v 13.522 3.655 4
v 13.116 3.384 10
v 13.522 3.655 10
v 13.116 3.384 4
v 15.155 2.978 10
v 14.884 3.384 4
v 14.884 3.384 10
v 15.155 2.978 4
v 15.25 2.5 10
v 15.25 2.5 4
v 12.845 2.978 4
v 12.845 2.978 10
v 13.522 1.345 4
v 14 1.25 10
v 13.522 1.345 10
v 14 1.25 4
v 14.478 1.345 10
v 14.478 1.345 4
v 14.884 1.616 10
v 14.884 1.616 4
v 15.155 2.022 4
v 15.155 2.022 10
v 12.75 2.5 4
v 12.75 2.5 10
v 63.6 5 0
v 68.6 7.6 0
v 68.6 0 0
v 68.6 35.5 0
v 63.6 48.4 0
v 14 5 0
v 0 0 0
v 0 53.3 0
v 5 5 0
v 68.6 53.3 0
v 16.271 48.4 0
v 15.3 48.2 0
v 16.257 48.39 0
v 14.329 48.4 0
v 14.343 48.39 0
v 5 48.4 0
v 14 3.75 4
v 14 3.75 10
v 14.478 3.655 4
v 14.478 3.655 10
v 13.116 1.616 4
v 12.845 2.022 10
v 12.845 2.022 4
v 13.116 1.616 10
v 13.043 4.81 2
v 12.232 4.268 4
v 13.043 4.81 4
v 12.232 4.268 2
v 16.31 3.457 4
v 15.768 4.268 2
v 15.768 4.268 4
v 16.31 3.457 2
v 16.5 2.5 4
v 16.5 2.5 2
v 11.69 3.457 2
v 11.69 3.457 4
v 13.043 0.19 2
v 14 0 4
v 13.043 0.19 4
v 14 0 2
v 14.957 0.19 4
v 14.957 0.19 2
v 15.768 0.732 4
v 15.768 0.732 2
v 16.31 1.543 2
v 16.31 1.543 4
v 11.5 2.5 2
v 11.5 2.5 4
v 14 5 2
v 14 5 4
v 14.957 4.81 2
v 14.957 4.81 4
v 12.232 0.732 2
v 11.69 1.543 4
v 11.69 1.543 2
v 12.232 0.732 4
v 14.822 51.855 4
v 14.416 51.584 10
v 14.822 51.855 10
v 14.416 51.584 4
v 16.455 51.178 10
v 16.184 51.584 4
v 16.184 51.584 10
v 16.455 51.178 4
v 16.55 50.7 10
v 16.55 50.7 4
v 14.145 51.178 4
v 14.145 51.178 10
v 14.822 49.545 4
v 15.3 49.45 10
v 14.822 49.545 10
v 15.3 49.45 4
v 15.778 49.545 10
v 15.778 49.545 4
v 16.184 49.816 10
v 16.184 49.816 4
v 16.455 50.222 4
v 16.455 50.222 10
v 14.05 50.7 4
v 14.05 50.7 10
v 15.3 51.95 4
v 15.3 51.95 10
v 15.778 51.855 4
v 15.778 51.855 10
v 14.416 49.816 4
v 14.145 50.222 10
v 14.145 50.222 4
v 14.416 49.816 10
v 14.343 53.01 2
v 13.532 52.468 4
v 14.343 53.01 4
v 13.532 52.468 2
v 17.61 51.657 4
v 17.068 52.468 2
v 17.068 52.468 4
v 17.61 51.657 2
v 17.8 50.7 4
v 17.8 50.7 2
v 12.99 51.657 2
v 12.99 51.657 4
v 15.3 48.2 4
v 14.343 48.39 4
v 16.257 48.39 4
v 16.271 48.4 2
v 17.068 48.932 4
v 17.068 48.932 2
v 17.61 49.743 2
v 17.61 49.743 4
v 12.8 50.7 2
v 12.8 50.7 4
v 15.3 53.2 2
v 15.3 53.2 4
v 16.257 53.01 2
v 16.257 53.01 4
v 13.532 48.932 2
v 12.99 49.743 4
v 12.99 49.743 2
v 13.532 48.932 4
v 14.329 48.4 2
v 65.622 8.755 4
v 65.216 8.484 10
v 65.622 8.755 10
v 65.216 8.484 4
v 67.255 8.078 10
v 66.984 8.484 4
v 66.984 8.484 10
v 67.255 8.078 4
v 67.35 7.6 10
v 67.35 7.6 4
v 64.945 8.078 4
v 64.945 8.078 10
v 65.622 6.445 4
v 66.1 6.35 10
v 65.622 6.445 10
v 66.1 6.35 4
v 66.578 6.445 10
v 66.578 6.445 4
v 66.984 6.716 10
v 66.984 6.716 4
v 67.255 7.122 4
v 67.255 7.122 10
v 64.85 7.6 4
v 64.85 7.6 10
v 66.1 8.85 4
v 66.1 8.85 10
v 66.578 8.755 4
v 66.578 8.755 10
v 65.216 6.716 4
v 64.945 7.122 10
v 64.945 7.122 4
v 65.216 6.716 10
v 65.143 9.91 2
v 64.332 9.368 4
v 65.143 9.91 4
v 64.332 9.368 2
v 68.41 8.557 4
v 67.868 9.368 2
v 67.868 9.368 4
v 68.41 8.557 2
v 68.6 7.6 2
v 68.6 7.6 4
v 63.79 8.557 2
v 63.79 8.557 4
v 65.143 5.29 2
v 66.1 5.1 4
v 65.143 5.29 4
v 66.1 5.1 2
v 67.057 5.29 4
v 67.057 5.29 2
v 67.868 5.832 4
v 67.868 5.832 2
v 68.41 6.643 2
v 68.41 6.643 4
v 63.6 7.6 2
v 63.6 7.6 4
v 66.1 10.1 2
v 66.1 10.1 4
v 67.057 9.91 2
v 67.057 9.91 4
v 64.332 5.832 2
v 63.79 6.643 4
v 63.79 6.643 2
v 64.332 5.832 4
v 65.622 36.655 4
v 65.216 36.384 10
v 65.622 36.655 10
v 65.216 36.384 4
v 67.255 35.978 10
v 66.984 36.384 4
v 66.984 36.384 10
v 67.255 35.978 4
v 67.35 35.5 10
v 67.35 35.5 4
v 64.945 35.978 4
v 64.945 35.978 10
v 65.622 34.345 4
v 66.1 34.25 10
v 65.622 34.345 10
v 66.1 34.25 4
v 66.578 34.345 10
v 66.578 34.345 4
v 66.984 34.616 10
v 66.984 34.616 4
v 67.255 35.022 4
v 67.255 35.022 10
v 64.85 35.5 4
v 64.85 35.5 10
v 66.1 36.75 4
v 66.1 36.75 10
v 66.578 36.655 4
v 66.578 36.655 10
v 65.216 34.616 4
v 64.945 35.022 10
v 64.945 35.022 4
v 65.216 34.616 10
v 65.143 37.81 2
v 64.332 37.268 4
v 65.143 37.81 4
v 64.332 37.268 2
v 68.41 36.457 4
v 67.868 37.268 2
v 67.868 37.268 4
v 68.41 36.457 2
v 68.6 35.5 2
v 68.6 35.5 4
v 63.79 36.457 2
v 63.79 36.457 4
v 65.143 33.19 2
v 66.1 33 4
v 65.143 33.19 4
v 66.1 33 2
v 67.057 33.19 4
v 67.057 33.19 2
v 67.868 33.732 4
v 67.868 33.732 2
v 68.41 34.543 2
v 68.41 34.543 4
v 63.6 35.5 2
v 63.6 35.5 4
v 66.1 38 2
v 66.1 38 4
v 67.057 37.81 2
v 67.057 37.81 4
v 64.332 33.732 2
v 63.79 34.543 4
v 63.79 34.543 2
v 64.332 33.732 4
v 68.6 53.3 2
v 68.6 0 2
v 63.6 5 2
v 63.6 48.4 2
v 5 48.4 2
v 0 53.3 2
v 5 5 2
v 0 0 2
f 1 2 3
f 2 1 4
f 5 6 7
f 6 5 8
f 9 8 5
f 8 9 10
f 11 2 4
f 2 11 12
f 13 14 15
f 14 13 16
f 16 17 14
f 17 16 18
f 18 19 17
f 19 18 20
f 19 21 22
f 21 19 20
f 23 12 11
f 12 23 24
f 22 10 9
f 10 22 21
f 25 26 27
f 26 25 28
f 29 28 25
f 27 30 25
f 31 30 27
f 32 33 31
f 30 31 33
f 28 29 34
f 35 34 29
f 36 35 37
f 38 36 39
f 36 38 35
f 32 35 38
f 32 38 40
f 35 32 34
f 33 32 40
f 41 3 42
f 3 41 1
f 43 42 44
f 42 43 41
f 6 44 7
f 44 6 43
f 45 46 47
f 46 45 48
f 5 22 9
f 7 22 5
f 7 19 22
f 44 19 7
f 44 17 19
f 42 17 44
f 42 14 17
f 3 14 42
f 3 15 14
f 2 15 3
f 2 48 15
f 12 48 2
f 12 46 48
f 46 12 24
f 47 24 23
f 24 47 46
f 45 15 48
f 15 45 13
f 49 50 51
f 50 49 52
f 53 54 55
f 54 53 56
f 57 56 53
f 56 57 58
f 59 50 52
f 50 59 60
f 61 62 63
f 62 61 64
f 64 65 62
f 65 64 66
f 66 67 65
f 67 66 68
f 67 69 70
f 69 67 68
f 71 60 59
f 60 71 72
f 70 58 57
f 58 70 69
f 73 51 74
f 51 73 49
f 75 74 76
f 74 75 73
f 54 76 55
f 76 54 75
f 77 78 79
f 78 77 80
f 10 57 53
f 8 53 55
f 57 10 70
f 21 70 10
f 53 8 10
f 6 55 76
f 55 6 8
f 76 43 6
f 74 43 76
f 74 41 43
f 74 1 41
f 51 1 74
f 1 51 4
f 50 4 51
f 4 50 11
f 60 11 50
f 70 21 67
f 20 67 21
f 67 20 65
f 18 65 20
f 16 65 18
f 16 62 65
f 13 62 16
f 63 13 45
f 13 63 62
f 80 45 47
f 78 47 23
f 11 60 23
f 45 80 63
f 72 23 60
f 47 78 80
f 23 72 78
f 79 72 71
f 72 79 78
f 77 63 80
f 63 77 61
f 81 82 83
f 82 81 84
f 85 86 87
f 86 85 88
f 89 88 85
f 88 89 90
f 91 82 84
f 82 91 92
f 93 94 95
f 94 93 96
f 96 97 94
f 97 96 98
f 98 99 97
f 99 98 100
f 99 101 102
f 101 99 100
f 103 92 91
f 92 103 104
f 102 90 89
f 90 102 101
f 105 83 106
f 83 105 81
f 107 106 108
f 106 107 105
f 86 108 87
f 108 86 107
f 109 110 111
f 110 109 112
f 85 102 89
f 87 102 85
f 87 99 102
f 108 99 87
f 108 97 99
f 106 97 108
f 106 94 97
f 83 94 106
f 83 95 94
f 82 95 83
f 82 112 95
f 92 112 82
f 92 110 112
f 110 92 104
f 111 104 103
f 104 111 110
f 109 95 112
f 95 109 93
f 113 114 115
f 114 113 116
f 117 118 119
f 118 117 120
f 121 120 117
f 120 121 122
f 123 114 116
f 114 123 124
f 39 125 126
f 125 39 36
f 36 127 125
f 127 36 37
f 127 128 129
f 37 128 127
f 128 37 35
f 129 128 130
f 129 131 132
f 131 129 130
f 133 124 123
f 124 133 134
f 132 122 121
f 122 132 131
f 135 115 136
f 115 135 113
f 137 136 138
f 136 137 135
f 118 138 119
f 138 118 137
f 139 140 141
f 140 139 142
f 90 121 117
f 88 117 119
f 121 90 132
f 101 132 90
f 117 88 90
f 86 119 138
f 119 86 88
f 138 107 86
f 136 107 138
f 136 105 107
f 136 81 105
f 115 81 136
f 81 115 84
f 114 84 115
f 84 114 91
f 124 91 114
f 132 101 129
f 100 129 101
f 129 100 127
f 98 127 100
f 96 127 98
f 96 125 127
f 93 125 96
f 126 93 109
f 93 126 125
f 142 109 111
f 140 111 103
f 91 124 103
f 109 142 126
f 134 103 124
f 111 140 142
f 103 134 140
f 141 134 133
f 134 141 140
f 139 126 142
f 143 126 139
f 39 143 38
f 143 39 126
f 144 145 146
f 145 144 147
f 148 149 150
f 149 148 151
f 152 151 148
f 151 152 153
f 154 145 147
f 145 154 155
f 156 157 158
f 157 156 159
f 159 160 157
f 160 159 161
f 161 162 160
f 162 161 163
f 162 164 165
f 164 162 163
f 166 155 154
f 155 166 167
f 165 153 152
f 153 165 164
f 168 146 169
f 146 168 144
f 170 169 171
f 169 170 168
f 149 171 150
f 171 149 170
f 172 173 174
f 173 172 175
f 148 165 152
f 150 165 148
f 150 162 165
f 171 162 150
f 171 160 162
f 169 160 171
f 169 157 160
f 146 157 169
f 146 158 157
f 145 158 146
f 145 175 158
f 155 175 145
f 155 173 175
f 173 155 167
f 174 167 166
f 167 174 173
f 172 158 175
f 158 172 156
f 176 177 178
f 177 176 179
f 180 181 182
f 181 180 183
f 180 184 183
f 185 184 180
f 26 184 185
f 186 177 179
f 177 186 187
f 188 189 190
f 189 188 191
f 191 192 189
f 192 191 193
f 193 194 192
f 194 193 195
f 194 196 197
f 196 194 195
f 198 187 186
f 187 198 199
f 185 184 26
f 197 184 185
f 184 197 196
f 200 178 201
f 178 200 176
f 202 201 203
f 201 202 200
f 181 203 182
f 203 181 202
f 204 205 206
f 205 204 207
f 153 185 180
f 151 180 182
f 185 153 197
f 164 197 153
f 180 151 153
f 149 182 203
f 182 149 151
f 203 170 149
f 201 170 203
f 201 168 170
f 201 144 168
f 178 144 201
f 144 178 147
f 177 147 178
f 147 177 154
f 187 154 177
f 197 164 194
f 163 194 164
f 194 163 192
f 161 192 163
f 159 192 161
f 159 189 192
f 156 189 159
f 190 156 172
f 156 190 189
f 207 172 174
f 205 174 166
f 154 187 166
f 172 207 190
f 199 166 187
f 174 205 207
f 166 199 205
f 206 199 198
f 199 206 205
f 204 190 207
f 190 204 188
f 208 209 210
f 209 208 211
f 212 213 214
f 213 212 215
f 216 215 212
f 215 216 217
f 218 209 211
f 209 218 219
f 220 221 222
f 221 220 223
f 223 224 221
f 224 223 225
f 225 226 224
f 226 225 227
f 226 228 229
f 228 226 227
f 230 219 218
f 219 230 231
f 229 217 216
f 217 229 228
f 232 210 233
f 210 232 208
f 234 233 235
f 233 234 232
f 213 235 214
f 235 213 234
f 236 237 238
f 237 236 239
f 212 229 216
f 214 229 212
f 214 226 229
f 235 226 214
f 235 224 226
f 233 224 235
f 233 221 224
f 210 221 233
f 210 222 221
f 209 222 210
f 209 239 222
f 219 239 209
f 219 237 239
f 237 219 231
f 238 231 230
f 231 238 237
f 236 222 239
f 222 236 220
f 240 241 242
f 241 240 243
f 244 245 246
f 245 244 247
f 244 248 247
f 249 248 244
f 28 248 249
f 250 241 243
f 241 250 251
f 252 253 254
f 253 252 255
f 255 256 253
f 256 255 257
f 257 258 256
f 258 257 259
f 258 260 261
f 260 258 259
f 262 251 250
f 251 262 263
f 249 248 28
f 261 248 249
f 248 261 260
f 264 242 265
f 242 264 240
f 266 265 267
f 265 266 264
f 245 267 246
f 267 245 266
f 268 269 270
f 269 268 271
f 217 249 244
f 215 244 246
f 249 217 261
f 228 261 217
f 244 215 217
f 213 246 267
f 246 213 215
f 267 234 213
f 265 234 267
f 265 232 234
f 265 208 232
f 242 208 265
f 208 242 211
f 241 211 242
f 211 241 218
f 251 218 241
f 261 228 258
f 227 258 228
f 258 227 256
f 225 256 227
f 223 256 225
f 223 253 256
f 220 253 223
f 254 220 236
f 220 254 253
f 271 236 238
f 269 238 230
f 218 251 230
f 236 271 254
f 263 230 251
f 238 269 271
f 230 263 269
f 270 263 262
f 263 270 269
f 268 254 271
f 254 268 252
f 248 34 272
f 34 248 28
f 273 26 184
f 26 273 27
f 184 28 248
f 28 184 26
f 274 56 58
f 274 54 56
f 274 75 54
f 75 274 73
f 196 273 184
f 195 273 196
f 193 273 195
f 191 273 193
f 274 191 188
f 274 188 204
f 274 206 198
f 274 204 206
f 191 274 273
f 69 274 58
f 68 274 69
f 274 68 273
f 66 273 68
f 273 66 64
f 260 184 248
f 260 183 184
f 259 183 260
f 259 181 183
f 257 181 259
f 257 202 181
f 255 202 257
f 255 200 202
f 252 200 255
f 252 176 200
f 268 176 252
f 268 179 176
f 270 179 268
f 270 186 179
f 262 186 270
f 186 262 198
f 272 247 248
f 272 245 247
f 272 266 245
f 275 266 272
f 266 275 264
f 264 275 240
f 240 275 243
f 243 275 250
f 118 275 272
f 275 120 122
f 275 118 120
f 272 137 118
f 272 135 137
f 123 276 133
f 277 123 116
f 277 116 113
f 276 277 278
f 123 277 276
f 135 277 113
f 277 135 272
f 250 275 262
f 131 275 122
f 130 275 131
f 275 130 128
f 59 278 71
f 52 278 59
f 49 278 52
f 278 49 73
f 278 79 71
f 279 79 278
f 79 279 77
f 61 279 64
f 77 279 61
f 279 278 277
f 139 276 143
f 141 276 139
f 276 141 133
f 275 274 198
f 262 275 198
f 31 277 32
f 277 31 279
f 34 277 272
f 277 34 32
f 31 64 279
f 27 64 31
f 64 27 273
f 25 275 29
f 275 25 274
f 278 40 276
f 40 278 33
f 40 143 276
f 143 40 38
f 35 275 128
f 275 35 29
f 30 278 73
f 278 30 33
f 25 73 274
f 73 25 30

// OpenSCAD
// Minimalist tray for Arduino and Arduino-like boards, to stop them sliding all
// over the desk.

// Measurements from https://blog.protoneer.co.nz/arduino-uno-and-mega-dimensions/
// Not actually tested yet but you get the idea.

$fn=16;

// Tweak the sizes here to make it push fit.
module pin() {
    cylinder(h=10,d=2.5);
    cylinder(h=4,d=5);
}

translate([14,2.5,0]) pin();
translate([15.3,2.5+5.1+27.9+15.2,0]) pin();
translate([14+1.3+50.8, 2.5+5.1, 0]) pin();
translate([14+1.3+50.8, 2.5+5.1+27.9]) pin();

difference() {
    cube([68.6,53.3,2]);
    translate([5,5,0]) cube([58.6,43.4,2]);
}
